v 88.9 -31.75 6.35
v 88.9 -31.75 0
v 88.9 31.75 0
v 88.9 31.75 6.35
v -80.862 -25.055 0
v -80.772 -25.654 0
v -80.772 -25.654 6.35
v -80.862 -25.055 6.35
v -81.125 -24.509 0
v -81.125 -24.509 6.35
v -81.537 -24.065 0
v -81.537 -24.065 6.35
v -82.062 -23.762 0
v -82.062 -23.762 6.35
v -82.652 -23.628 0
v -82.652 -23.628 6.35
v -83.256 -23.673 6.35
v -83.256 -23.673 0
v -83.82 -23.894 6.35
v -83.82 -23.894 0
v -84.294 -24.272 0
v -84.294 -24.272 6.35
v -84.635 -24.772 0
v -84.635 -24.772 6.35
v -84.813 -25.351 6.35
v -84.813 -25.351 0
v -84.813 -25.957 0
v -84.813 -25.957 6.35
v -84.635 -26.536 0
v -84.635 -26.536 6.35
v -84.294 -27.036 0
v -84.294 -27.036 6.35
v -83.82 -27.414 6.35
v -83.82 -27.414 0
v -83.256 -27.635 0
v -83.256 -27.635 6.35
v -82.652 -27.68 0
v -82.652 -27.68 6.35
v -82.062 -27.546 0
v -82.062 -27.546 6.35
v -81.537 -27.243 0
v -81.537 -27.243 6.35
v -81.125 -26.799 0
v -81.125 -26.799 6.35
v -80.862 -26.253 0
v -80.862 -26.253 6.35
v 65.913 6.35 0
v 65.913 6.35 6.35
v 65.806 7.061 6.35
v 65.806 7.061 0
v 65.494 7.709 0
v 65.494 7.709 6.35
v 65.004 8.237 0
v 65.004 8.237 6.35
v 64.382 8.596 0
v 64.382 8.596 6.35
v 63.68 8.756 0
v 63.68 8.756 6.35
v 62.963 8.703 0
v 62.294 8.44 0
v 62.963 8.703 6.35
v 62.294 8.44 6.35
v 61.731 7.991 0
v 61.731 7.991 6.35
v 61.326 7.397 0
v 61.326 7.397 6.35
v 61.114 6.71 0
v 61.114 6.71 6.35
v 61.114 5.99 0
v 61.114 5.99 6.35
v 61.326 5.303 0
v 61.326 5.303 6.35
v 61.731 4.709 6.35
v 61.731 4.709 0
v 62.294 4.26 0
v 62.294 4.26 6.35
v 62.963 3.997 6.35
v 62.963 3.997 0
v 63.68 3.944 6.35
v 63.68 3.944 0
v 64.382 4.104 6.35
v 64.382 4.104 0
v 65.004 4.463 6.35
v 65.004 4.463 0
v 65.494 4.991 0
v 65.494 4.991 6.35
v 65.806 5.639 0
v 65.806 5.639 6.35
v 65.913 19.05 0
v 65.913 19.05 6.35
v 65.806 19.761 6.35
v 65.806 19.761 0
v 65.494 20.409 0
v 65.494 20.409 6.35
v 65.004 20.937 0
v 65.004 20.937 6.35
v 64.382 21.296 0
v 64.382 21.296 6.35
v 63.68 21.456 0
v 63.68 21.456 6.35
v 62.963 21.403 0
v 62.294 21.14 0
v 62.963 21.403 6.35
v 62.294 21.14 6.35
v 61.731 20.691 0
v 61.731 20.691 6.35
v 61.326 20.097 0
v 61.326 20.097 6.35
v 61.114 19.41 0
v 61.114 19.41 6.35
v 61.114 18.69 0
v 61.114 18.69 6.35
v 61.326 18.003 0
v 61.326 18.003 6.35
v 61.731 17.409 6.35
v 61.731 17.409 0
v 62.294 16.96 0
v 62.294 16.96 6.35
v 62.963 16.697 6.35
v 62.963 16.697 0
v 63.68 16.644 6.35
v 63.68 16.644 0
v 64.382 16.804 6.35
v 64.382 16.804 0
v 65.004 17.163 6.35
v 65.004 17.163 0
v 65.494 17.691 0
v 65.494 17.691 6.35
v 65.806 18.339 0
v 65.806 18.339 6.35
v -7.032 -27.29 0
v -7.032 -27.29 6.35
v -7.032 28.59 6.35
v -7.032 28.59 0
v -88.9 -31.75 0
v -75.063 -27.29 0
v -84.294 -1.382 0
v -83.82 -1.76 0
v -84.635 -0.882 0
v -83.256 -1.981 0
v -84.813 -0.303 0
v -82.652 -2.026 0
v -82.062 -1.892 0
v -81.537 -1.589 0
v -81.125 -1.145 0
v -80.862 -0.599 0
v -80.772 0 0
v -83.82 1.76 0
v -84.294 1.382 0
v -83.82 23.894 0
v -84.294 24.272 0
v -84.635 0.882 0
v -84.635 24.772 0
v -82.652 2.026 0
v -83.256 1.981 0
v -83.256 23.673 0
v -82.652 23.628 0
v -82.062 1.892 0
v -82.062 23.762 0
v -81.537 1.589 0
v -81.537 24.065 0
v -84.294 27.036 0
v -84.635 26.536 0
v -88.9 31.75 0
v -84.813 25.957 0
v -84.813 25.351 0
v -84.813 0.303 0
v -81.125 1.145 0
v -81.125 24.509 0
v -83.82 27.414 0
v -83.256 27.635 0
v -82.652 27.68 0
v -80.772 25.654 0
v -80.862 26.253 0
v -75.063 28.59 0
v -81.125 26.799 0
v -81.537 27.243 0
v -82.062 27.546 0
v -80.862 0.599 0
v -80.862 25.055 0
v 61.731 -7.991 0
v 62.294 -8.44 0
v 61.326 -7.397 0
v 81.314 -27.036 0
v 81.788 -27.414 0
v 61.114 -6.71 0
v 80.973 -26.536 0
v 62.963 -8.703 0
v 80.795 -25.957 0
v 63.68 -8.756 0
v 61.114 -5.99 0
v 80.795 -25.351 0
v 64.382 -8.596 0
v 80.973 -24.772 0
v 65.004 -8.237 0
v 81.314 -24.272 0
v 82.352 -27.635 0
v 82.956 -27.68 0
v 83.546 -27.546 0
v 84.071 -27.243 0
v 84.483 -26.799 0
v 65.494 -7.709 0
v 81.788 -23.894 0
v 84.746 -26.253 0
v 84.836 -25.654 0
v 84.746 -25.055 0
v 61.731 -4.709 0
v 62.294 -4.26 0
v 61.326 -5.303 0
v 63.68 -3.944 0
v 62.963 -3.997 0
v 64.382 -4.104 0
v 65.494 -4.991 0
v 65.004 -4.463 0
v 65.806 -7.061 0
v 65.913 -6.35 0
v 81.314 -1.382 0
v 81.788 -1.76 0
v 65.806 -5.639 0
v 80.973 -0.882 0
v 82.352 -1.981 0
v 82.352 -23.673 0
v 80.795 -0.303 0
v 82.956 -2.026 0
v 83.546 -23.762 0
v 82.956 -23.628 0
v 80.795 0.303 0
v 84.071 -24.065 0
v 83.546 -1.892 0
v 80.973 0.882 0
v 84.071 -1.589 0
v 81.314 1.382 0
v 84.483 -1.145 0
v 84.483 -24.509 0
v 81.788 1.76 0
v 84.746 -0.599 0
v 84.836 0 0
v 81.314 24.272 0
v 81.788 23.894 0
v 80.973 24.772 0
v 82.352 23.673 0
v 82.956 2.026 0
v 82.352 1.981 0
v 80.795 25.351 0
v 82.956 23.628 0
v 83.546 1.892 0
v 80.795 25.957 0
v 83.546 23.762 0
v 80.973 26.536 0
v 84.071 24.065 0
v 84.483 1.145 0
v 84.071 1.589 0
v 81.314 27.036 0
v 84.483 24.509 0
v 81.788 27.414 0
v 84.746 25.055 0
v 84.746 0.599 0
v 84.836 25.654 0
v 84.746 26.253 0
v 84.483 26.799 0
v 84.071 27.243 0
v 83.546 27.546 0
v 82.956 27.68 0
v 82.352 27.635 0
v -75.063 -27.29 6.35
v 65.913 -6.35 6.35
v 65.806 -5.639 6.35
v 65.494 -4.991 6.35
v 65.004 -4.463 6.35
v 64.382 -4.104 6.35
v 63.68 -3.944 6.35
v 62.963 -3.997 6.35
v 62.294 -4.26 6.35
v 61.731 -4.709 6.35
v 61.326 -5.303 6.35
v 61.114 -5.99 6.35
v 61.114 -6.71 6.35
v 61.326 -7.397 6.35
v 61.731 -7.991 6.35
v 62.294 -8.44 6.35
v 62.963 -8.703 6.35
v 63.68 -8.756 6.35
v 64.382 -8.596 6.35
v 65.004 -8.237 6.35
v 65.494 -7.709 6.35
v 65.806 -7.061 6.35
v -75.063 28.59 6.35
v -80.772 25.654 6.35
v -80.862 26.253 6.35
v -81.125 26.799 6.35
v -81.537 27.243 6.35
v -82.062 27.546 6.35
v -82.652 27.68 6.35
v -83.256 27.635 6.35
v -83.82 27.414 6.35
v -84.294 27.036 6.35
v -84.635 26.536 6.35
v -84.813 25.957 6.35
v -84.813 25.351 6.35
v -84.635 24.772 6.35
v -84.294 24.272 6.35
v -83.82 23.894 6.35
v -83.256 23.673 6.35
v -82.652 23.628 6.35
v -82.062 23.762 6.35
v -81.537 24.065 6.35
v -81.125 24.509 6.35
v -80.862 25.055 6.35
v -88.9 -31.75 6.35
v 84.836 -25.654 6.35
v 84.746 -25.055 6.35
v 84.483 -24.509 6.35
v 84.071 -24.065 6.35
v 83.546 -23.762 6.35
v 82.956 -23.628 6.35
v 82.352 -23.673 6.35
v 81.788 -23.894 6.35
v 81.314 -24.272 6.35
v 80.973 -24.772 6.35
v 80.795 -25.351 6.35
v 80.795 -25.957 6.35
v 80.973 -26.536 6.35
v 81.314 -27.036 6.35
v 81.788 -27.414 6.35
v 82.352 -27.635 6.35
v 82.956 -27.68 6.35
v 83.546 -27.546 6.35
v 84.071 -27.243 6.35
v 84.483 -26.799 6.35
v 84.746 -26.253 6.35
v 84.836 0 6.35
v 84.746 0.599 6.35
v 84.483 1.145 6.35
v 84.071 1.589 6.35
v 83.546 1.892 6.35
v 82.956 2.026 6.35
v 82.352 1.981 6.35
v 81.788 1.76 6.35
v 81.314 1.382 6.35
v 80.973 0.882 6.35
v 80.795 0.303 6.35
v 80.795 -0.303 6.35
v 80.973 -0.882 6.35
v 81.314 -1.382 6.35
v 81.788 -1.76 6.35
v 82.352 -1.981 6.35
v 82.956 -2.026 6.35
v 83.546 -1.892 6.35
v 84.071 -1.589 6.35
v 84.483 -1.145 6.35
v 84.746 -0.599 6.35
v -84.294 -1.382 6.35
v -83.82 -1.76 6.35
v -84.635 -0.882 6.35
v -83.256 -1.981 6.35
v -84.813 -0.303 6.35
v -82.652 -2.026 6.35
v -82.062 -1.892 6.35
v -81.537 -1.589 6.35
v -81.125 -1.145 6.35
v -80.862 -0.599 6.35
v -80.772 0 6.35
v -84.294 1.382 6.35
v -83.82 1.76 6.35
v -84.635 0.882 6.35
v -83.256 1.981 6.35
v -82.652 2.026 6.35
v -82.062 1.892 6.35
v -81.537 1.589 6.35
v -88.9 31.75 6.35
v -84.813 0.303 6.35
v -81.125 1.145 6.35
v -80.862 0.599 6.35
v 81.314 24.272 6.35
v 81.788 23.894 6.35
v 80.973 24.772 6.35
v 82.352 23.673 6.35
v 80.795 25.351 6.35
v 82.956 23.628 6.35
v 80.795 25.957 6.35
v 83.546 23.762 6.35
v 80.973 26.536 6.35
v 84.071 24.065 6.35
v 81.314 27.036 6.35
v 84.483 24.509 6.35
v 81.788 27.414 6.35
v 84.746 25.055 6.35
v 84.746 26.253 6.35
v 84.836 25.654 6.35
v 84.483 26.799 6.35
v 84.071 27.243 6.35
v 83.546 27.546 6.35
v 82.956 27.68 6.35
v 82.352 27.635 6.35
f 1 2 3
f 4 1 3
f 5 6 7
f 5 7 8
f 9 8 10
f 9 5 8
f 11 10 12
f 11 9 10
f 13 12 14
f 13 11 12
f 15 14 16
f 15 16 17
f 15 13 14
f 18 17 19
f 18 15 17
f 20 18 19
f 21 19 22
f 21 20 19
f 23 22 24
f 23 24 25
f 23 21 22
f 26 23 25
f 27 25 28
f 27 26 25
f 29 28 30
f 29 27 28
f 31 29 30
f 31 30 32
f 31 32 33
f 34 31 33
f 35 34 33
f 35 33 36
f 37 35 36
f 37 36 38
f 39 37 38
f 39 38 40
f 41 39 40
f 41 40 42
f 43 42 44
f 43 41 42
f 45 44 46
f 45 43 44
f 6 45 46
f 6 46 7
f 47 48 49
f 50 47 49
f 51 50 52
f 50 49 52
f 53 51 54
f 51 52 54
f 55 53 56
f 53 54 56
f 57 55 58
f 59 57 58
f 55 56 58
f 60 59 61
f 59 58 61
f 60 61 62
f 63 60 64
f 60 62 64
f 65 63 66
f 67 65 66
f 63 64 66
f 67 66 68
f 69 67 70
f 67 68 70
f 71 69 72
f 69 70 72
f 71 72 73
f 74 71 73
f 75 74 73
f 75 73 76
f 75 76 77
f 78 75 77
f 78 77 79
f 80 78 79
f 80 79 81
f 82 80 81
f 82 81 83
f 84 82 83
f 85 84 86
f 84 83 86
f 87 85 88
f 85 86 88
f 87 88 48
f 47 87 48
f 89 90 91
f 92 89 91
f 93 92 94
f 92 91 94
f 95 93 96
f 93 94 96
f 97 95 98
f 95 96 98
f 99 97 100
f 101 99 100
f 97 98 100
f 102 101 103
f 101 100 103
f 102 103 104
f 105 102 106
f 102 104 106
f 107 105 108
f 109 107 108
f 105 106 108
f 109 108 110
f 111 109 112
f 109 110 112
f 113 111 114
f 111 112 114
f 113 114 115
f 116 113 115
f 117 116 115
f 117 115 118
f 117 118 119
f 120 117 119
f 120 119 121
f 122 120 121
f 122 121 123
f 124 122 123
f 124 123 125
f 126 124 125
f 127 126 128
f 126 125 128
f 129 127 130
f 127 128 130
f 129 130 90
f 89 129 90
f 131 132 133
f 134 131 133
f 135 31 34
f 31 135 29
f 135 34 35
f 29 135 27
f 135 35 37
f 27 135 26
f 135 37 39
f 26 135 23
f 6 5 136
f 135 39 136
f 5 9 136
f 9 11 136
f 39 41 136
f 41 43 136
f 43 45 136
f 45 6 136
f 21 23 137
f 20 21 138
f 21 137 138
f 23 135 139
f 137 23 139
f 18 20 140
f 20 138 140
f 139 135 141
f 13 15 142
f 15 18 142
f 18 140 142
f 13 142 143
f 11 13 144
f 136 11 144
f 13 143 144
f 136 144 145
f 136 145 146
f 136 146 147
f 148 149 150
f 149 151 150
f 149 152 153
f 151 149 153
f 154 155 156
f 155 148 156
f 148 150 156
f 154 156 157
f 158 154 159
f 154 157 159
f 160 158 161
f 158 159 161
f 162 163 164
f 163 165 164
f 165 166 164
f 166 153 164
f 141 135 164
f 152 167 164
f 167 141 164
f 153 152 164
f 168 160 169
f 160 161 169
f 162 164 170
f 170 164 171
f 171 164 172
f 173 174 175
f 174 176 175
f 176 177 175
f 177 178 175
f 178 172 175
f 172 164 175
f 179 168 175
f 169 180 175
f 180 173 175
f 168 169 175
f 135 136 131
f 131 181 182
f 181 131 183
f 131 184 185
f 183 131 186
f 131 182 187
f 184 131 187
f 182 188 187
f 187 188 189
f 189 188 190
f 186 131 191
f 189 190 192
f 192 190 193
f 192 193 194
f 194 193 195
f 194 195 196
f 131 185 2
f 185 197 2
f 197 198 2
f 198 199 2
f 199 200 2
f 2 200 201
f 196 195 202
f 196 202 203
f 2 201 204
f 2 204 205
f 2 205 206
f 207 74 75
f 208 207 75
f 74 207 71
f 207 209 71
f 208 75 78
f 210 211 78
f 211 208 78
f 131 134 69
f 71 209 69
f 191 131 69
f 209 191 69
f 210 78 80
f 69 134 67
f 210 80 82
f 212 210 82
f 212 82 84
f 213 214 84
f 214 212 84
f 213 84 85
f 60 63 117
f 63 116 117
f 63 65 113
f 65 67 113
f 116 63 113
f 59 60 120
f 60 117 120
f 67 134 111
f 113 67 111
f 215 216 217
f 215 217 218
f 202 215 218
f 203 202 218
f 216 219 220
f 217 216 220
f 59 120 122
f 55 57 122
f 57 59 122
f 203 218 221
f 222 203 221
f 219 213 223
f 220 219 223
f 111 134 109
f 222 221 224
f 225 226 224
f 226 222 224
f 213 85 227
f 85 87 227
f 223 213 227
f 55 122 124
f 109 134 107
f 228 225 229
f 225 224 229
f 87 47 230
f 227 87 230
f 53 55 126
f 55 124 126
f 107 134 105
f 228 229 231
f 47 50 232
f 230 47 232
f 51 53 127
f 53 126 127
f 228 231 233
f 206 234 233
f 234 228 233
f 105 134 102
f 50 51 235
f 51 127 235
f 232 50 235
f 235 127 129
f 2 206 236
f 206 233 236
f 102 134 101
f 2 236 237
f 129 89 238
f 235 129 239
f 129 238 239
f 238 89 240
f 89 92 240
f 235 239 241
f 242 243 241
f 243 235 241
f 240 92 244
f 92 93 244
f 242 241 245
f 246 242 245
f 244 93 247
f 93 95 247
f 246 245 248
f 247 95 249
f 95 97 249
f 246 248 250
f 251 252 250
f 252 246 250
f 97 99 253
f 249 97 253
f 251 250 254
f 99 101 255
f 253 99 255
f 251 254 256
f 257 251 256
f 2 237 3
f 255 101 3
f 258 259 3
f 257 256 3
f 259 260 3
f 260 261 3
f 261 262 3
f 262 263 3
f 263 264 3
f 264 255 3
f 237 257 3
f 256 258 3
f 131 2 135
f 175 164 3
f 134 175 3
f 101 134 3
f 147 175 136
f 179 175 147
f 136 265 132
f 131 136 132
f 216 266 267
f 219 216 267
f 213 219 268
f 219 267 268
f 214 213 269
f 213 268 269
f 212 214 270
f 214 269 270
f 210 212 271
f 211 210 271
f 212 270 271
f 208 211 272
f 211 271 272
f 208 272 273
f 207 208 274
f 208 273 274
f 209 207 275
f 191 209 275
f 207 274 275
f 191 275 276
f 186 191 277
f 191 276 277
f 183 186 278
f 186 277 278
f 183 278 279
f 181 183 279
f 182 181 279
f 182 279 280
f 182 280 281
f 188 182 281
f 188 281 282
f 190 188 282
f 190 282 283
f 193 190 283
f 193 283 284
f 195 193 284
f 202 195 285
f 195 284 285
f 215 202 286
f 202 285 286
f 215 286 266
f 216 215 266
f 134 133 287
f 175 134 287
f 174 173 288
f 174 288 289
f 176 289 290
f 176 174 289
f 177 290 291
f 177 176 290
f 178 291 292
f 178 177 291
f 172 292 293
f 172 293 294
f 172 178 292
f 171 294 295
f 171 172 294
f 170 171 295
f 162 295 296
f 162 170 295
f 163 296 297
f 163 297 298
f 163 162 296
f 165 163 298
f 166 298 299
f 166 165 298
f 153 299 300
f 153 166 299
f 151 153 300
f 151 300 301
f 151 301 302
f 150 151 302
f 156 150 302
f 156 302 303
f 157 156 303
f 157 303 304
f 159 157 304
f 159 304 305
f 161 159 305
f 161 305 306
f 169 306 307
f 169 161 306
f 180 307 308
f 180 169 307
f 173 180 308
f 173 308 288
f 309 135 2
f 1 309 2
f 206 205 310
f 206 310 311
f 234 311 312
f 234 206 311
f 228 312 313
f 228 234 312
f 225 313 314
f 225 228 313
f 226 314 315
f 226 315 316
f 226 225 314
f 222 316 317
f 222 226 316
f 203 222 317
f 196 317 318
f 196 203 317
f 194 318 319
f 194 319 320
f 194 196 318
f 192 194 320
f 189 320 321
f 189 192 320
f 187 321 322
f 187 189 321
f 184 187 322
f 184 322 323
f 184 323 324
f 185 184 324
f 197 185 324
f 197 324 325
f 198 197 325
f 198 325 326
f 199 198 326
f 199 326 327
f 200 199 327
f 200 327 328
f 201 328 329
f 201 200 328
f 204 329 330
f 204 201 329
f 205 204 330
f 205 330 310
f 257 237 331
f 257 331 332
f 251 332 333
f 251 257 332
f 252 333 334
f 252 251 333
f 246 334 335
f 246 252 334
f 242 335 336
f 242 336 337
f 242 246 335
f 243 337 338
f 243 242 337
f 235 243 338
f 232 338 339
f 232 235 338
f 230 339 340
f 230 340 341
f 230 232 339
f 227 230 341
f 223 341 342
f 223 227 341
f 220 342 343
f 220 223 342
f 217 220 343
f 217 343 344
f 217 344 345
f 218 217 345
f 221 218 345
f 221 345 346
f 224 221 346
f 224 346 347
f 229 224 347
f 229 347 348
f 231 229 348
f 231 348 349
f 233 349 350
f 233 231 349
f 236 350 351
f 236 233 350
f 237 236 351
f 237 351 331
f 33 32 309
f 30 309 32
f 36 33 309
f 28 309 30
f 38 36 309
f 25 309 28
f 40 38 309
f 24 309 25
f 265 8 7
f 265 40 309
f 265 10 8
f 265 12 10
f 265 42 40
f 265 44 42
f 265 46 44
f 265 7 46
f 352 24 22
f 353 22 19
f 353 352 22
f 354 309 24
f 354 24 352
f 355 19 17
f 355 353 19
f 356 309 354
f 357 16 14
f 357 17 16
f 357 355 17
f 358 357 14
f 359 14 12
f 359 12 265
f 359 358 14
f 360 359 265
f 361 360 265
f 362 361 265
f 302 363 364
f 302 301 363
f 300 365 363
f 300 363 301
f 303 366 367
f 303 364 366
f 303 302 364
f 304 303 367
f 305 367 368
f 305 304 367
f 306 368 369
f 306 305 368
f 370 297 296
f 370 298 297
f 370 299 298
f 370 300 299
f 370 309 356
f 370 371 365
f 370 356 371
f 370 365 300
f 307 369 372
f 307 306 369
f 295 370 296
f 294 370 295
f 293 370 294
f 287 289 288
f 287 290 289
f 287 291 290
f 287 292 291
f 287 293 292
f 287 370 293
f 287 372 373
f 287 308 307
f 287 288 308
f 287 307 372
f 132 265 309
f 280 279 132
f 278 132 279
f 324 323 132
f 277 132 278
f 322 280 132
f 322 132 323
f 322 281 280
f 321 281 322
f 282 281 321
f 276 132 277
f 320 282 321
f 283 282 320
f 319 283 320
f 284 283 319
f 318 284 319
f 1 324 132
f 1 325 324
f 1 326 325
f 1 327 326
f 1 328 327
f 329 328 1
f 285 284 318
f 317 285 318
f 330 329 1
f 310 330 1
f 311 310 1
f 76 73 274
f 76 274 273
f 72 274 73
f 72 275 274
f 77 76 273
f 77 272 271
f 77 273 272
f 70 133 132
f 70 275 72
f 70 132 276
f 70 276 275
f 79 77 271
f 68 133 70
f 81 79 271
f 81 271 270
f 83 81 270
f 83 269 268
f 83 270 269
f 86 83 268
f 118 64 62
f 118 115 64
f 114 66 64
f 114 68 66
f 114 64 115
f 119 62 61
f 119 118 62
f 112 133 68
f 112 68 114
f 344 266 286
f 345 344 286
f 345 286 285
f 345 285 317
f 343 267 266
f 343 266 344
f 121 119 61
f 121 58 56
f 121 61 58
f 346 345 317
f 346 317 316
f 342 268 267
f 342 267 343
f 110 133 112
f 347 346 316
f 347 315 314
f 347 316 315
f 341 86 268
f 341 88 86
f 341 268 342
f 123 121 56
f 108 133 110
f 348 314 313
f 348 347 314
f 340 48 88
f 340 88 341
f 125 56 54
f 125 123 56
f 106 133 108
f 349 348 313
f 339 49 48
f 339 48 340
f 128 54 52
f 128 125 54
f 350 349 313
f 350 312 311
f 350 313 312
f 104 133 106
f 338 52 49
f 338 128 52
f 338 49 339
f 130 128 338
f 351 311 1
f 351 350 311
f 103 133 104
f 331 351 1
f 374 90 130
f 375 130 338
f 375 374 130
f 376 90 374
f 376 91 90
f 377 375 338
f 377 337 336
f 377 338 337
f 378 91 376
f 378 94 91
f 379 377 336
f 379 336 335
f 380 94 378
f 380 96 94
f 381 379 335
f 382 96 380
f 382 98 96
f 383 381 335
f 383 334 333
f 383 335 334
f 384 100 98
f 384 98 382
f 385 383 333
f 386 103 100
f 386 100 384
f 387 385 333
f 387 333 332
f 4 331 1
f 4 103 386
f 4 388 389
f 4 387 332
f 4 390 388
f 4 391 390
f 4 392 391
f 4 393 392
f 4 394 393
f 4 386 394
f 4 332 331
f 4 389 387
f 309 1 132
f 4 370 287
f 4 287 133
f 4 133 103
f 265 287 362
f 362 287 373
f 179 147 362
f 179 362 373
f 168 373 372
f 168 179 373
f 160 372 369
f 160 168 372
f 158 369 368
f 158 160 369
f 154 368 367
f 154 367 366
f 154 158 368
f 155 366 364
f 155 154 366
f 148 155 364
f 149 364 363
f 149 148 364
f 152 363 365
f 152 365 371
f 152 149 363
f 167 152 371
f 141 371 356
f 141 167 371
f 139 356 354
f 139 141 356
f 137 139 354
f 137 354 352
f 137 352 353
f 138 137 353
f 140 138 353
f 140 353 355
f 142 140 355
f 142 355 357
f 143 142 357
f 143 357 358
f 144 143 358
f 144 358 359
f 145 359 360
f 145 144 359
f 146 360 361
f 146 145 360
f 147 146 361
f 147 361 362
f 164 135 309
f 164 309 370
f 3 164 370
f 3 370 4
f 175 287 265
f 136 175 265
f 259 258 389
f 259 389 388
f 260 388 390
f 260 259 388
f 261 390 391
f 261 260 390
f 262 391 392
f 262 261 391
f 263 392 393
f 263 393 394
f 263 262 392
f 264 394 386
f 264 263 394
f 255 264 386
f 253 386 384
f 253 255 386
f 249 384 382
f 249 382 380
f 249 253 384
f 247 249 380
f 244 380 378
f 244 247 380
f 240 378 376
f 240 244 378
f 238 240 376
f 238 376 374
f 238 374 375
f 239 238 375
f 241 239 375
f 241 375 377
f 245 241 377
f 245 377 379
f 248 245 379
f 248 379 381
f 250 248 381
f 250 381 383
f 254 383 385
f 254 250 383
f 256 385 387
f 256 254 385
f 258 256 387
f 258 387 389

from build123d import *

# Parameters (mm, degrees)
SKETCH1_W           = 177.8
SKETCH1_H           = 63.5
SKETCH1_R           = 2.032
BOSS_EXTRUDE1_DEPTH = 6.35
CUT_EXTRUDE1_DEPTH  = 6.35
SKETCH3_R           = 2.413
CUT_EXTRUDE2_DEPTH  = 6.35
LPATTERN1_COUNT     = 3
LPATTERN1_PITCH     = 12.7


with BuildPart() as part:
    # Sketch1 → Boss-Extrude1 (new body)
    with BuildSketch(Plane.XY):
        Rectangle(SKETCH1_W, SKETCH1_H)
        with Locations((-82.804, 25.654)):
            Circle(SKETCH1_R, mode=Mode.SUBTRACT)
        with Locations((-82.804, 0)):
            Circle(SKETCH1_R, mode=Mode.SUBTRACT)
        with Locations((-82.804, -25.654)):
            Circle(SKETCH1_R, mode=Mode.SUBTRACT)
        with Locations((82.804, -25.654)):
            Circle(SKETCH1_R, mode=Mode.SUBTRACT)
        with Locations((82.804, 0)):
            Circle(SKETCH1_R, mode=Mode.SUBTRACT)
        with Locations((82.804, 25.654)):
            Circle(SKETCH1_R, mode=Mode.SUBTRACT)
    extrude(amount=BOSS_EXTRUDE1_DEPTH)

    # Sketch2 → Cut-Extrude1 (cut)
    with BuildSketch(Plane.XY.offset(6.35)):
        Polygon((-75.063183589, 28.589529071), (-75.063183589, -27.290470929), (-51.281087561, -27.290470929), (-50.94437734, 0.649529071), (-50.94437734, 28.589529071), align=None)
        Polygon((-50.94437734, 0.649529071), (-51.281087561, -27.290470929), (-7.031936064, -27.290470929), (-7.031936064, 28.589529071), (-50.94437734, 28.589529071), align=None)
    extrude(amount=-CUT_EXTRUDE1_DEPTH, mode=Mode.SUBTRACT)

    # Sketch3 → Cut-Extrude2 (cut)
    with BuildSketch(Plane.XY.offset(6.35)):
        with Locations((63.5, 19.05)):
            Circle(SKETCH3_R)
    cut_extrude2 = extrude(amount=-CUT_EXTRUDE2_DEPTH, mode=Mode.SUBTRACT)

    # LPattern1: Cut-Extrude2 ×3
    with Locations(*[(0, -i * LPATTERN1_PITCH, 0) for i in range(1, LPATTERN1_COUNT)]):
        add(cut_extrude2, mode=Mode.SUBTRACT)


solid = part.part
